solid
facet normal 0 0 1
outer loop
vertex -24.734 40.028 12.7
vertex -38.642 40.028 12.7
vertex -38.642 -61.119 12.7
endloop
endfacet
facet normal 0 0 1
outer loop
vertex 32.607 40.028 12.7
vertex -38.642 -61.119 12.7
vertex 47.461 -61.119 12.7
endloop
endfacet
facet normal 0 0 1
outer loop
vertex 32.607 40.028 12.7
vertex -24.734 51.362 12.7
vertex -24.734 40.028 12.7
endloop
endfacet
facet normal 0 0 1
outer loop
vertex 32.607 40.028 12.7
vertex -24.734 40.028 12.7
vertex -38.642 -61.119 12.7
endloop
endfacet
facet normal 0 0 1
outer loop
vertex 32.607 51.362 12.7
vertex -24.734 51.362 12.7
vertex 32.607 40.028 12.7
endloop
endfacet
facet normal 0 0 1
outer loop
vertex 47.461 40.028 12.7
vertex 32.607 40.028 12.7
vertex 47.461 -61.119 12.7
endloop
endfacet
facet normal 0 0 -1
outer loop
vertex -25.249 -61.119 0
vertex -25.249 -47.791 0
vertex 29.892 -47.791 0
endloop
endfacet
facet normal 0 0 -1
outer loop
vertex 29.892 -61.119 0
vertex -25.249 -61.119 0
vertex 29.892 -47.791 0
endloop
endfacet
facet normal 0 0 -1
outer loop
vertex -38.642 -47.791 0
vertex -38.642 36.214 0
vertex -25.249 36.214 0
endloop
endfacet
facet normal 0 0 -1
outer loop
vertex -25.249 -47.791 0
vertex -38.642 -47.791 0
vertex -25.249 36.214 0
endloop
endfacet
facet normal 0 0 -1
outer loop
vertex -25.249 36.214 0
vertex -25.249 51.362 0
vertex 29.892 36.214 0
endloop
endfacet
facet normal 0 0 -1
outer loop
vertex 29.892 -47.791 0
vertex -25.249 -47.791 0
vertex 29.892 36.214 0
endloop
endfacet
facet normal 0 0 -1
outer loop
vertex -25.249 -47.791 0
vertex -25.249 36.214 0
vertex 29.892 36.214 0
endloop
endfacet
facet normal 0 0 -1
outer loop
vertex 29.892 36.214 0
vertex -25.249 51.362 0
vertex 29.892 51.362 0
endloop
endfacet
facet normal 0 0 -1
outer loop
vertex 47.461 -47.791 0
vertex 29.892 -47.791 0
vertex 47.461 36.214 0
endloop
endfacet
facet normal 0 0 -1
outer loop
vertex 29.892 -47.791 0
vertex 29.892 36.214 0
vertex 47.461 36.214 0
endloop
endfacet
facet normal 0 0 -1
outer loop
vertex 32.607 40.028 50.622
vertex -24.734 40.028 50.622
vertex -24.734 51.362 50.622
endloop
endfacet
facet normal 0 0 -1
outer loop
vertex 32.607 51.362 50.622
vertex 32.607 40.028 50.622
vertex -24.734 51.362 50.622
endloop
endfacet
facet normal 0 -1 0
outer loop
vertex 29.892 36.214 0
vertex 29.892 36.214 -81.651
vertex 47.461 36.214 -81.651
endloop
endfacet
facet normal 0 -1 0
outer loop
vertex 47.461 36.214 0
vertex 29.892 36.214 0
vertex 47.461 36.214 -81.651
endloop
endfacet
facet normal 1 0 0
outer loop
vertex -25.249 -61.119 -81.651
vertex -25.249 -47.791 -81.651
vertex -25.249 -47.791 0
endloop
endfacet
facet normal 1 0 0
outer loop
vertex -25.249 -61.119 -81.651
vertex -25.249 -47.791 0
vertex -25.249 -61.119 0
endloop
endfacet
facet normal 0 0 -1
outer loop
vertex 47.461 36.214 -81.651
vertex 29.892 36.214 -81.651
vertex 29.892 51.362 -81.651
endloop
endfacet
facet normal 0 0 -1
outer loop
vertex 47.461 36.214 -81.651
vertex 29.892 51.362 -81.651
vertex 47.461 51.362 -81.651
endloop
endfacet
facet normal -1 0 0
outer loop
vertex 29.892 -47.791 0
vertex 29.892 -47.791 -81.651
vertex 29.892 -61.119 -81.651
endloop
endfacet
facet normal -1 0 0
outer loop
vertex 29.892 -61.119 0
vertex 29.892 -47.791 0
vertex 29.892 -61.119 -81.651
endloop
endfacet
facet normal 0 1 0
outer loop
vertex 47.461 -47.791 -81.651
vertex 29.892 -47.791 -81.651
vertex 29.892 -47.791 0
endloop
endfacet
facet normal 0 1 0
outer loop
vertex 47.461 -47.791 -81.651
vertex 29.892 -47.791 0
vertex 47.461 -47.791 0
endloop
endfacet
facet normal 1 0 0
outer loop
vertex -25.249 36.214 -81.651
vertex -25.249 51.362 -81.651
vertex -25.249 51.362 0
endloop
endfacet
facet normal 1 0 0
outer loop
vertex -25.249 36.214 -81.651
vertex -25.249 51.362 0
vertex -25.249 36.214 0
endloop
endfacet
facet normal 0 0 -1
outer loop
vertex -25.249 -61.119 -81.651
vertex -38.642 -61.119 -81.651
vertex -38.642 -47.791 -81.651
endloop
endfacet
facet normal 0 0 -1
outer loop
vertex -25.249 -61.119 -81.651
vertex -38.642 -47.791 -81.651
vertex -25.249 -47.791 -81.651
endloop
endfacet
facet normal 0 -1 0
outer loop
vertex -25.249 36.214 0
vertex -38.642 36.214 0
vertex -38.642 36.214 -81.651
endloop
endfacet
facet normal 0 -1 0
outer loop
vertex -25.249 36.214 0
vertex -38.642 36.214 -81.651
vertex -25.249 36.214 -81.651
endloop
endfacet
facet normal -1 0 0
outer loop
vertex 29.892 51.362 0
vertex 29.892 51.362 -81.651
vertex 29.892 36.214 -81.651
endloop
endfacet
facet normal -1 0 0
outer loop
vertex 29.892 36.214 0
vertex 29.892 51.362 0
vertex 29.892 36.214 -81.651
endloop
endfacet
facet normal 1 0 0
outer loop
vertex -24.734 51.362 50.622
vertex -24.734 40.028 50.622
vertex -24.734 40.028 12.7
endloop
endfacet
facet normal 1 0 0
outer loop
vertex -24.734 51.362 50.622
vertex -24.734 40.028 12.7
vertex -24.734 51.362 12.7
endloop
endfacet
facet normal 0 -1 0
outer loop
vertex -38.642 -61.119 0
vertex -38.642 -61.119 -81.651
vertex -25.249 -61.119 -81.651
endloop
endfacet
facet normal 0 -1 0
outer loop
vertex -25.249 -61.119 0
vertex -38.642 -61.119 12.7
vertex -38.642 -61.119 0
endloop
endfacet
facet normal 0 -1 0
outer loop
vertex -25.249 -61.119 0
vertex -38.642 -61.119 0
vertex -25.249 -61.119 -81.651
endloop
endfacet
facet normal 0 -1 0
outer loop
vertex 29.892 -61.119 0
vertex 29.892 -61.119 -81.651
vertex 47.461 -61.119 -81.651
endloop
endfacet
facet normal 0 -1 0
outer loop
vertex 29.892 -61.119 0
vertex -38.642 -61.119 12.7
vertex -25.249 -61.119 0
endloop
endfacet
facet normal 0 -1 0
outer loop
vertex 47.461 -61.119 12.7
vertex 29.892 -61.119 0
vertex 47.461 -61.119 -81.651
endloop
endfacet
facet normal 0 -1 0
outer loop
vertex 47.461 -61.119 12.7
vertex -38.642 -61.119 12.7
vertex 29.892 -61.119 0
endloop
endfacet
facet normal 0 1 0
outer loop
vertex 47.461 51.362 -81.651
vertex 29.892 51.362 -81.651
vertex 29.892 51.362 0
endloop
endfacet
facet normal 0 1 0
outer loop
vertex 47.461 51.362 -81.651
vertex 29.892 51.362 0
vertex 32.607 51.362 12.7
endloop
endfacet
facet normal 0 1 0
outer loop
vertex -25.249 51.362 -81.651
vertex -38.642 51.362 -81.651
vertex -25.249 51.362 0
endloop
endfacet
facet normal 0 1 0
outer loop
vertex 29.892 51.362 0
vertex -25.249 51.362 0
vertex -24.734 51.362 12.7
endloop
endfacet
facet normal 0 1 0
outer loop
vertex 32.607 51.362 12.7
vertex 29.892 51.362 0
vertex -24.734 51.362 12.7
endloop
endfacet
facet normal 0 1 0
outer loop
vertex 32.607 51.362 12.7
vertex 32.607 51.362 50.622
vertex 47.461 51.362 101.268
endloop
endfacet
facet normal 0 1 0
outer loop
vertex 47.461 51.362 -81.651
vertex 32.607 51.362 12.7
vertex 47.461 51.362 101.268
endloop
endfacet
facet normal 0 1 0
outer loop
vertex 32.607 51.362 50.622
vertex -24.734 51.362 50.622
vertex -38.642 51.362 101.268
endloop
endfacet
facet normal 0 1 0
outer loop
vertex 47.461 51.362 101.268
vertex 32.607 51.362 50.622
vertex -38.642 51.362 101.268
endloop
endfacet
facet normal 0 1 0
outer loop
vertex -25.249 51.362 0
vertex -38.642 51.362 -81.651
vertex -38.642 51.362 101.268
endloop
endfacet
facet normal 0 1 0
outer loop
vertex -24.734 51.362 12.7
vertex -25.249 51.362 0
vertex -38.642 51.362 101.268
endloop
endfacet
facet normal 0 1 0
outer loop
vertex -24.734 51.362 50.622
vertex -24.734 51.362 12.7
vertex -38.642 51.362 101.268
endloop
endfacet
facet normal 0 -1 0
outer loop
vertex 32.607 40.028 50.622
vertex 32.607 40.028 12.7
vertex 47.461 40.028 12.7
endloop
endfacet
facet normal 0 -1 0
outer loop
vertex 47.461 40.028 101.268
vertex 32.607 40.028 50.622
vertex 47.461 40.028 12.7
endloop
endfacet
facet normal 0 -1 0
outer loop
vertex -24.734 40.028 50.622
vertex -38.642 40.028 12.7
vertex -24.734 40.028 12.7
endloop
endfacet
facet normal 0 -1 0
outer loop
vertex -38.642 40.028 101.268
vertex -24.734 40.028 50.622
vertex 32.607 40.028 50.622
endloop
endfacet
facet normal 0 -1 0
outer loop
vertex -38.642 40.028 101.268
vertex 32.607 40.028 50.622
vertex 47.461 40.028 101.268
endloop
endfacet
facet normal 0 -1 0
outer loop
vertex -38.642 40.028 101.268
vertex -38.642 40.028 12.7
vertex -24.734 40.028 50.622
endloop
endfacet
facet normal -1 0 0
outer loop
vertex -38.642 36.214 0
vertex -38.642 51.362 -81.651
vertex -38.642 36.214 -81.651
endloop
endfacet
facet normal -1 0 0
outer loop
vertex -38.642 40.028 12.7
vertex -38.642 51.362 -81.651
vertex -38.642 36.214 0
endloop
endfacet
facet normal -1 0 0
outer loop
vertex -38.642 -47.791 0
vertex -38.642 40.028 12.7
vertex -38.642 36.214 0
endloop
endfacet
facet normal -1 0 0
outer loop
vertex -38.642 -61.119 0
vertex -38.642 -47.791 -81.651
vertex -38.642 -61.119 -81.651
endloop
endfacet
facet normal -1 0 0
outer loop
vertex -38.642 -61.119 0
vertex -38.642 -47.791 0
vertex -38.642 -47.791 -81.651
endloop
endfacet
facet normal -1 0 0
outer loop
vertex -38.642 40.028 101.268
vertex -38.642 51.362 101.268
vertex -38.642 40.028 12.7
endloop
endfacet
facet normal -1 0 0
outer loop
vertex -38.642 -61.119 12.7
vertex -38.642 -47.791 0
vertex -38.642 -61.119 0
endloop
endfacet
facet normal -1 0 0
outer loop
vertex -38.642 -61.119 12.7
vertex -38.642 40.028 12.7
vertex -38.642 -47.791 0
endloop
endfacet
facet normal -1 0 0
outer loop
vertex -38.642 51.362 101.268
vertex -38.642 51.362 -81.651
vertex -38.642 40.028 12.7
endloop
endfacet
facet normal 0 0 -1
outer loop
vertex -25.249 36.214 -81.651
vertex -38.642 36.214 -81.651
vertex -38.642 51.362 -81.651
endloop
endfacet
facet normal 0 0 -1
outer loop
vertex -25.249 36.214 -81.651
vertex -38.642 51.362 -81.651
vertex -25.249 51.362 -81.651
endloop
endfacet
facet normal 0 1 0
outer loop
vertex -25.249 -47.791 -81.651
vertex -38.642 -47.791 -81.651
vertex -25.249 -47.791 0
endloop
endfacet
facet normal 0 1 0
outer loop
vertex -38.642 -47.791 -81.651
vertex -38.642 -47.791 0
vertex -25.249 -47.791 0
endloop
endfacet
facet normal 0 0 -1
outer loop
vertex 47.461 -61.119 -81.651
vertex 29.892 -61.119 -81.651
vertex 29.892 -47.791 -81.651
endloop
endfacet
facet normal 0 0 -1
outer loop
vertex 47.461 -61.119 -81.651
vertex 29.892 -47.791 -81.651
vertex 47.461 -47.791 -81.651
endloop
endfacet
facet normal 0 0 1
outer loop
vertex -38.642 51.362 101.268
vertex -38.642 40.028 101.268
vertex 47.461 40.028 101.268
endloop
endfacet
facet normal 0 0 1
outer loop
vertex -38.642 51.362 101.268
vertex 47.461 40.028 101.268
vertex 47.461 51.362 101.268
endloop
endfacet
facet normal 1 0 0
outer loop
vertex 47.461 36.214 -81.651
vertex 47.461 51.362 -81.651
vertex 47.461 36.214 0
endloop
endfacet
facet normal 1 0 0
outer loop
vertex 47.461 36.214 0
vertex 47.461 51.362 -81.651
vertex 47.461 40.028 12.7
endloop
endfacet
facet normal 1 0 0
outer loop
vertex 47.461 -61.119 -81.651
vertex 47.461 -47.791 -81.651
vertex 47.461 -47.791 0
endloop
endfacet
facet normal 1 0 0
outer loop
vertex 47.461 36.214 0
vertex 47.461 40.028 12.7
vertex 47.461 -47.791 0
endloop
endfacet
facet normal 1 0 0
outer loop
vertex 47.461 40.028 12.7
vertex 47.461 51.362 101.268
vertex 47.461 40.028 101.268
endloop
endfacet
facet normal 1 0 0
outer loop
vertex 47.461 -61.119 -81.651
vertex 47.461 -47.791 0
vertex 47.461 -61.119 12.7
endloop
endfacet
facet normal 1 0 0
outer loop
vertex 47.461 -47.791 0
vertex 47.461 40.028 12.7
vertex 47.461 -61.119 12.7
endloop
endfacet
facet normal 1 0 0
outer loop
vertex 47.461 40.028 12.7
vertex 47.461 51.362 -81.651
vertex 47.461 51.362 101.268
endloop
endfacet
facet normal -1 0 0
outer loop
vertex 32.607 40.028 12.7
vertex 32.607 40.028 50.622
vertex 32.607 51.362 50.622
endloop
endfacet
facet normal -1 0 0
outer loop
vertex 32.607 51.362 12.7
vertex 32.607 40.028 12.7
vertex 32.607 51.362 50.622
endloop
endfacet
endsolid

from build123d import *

# Parameters (mm, degrees)
F0_W     = 86.1037485301
F0_H     = 112.4806329608
F1_DEPTH = 12.7
F2_W     = 13.9083378017
F2_H     = 11.3344117999
F2_W_2   = 14.853797853
F3_DEPTH = 88.5675344616
F4_W     = 17.5688937306
F4_H     = 13.3278891444
F4_H_2   = 15.1476562023
F4_W_2   = 13.3936516941
F5_DEPTH = 71.4913029224
F6_W     = 11.3344117999
F6_H     = 50.6459615797
F7_DEPTH = 57.3416128755
F8_DEPTH = 10.16


with BuildPart() as f1:
    # F0 (on Top) → F1 (new body)
    with BuildSketch(Plane.XY):
        with Locations((4.4093746692, -4.878398031)):
            Rectangle(F0_W, F0_H)
    extrude(amount=F1_DEPTH)

    # F2 (on face) → F3 (join)
    with BuildSketch(Plane.XY.offset(12.7)):
        with Locations((-31.688330695, 45.6947125494)):
            Rectangle(F2_W, F2_H)
        with Locations((40.0343500078, 45.6947125494)):
            Rectangle(F2_W_2, F2_H)
    extrude(amount=F3_DEPTH)

    # F4 (on face) → F5 (join)
    with BuildSketch(Plane(origin=(0, 0, 0), x_dir=(1, 0, 0), z_dir=(0, 0, -1))):
        with Locations((38.6768020689, 54.4547699392)):
            Rectangle(F4_W, F4_H)
        with Locations((38.6768020689, -43.7880903482)):
            Rectangle(F4_W, F4_H_2)
        with Locations((-31.9456737489, -43.7880903482)):
            Rectangle(F4_W_2, F4_H_2)
        with Locations((-31.9456737489, 54.4547699392)):
            Rectangle(F4_W_2, F4_H)
    extrude(amount=F5_DEPTH)

    # F6 (on face) → F7 (join, through all)
    with BuildSketch(Plane.YZ.offset(-24.7341617942)):
        with Locations((45.6947125494, 75.9445536718)):
            Rectangle(F6_W, F6_H)
    extrude(amount=F7_DEPTH)

    # F8 (add): faces of the model
    f8_faces = [f1.faces().sort_by_distance(p)[0] for p in [
        (-31.9456737489, -54.4547699392, -71.4913029224),
        (38.6768020689, -54.4547699392, -71.4913029224),
        (38.6768020689, 43.7880903482, -71.4913029224),
        (-31.9456737489, 43.7880903482, -71.4913029224),
        (-31.9456737489, -54.4547699392, -71.4913029224),
        (38.6768020689, -54.4547699392, -71.4913029224),
        (38.6768020689, 43.7880903482, -71.4913029224),
        (-31.9456737489, 43.7880903482, -71.4913029224),
        (-31.9456737489, -54.4547699392, -71.4913029224),
        (38.6768020689, -54.4547699392, -71.4913029224),
        (38.6768020689, 43.7880903482, -71.4913029224),
        (-31.9456737489, 43.7880903482, -71.4913029224),
        (-31.9456737489, -54.4547699392, -71.4913029224),
        (38.6768020689, -54.4547699392, -71.4913029224),
        (38.6768020689, 43.7880903482, -71.4913029224),
        (-31.9456737489, 43.7880903482, -71.4913029224),
    ]]
    extrude(f8_faces, amount=F8_DEPTH)


solid = f1.part
